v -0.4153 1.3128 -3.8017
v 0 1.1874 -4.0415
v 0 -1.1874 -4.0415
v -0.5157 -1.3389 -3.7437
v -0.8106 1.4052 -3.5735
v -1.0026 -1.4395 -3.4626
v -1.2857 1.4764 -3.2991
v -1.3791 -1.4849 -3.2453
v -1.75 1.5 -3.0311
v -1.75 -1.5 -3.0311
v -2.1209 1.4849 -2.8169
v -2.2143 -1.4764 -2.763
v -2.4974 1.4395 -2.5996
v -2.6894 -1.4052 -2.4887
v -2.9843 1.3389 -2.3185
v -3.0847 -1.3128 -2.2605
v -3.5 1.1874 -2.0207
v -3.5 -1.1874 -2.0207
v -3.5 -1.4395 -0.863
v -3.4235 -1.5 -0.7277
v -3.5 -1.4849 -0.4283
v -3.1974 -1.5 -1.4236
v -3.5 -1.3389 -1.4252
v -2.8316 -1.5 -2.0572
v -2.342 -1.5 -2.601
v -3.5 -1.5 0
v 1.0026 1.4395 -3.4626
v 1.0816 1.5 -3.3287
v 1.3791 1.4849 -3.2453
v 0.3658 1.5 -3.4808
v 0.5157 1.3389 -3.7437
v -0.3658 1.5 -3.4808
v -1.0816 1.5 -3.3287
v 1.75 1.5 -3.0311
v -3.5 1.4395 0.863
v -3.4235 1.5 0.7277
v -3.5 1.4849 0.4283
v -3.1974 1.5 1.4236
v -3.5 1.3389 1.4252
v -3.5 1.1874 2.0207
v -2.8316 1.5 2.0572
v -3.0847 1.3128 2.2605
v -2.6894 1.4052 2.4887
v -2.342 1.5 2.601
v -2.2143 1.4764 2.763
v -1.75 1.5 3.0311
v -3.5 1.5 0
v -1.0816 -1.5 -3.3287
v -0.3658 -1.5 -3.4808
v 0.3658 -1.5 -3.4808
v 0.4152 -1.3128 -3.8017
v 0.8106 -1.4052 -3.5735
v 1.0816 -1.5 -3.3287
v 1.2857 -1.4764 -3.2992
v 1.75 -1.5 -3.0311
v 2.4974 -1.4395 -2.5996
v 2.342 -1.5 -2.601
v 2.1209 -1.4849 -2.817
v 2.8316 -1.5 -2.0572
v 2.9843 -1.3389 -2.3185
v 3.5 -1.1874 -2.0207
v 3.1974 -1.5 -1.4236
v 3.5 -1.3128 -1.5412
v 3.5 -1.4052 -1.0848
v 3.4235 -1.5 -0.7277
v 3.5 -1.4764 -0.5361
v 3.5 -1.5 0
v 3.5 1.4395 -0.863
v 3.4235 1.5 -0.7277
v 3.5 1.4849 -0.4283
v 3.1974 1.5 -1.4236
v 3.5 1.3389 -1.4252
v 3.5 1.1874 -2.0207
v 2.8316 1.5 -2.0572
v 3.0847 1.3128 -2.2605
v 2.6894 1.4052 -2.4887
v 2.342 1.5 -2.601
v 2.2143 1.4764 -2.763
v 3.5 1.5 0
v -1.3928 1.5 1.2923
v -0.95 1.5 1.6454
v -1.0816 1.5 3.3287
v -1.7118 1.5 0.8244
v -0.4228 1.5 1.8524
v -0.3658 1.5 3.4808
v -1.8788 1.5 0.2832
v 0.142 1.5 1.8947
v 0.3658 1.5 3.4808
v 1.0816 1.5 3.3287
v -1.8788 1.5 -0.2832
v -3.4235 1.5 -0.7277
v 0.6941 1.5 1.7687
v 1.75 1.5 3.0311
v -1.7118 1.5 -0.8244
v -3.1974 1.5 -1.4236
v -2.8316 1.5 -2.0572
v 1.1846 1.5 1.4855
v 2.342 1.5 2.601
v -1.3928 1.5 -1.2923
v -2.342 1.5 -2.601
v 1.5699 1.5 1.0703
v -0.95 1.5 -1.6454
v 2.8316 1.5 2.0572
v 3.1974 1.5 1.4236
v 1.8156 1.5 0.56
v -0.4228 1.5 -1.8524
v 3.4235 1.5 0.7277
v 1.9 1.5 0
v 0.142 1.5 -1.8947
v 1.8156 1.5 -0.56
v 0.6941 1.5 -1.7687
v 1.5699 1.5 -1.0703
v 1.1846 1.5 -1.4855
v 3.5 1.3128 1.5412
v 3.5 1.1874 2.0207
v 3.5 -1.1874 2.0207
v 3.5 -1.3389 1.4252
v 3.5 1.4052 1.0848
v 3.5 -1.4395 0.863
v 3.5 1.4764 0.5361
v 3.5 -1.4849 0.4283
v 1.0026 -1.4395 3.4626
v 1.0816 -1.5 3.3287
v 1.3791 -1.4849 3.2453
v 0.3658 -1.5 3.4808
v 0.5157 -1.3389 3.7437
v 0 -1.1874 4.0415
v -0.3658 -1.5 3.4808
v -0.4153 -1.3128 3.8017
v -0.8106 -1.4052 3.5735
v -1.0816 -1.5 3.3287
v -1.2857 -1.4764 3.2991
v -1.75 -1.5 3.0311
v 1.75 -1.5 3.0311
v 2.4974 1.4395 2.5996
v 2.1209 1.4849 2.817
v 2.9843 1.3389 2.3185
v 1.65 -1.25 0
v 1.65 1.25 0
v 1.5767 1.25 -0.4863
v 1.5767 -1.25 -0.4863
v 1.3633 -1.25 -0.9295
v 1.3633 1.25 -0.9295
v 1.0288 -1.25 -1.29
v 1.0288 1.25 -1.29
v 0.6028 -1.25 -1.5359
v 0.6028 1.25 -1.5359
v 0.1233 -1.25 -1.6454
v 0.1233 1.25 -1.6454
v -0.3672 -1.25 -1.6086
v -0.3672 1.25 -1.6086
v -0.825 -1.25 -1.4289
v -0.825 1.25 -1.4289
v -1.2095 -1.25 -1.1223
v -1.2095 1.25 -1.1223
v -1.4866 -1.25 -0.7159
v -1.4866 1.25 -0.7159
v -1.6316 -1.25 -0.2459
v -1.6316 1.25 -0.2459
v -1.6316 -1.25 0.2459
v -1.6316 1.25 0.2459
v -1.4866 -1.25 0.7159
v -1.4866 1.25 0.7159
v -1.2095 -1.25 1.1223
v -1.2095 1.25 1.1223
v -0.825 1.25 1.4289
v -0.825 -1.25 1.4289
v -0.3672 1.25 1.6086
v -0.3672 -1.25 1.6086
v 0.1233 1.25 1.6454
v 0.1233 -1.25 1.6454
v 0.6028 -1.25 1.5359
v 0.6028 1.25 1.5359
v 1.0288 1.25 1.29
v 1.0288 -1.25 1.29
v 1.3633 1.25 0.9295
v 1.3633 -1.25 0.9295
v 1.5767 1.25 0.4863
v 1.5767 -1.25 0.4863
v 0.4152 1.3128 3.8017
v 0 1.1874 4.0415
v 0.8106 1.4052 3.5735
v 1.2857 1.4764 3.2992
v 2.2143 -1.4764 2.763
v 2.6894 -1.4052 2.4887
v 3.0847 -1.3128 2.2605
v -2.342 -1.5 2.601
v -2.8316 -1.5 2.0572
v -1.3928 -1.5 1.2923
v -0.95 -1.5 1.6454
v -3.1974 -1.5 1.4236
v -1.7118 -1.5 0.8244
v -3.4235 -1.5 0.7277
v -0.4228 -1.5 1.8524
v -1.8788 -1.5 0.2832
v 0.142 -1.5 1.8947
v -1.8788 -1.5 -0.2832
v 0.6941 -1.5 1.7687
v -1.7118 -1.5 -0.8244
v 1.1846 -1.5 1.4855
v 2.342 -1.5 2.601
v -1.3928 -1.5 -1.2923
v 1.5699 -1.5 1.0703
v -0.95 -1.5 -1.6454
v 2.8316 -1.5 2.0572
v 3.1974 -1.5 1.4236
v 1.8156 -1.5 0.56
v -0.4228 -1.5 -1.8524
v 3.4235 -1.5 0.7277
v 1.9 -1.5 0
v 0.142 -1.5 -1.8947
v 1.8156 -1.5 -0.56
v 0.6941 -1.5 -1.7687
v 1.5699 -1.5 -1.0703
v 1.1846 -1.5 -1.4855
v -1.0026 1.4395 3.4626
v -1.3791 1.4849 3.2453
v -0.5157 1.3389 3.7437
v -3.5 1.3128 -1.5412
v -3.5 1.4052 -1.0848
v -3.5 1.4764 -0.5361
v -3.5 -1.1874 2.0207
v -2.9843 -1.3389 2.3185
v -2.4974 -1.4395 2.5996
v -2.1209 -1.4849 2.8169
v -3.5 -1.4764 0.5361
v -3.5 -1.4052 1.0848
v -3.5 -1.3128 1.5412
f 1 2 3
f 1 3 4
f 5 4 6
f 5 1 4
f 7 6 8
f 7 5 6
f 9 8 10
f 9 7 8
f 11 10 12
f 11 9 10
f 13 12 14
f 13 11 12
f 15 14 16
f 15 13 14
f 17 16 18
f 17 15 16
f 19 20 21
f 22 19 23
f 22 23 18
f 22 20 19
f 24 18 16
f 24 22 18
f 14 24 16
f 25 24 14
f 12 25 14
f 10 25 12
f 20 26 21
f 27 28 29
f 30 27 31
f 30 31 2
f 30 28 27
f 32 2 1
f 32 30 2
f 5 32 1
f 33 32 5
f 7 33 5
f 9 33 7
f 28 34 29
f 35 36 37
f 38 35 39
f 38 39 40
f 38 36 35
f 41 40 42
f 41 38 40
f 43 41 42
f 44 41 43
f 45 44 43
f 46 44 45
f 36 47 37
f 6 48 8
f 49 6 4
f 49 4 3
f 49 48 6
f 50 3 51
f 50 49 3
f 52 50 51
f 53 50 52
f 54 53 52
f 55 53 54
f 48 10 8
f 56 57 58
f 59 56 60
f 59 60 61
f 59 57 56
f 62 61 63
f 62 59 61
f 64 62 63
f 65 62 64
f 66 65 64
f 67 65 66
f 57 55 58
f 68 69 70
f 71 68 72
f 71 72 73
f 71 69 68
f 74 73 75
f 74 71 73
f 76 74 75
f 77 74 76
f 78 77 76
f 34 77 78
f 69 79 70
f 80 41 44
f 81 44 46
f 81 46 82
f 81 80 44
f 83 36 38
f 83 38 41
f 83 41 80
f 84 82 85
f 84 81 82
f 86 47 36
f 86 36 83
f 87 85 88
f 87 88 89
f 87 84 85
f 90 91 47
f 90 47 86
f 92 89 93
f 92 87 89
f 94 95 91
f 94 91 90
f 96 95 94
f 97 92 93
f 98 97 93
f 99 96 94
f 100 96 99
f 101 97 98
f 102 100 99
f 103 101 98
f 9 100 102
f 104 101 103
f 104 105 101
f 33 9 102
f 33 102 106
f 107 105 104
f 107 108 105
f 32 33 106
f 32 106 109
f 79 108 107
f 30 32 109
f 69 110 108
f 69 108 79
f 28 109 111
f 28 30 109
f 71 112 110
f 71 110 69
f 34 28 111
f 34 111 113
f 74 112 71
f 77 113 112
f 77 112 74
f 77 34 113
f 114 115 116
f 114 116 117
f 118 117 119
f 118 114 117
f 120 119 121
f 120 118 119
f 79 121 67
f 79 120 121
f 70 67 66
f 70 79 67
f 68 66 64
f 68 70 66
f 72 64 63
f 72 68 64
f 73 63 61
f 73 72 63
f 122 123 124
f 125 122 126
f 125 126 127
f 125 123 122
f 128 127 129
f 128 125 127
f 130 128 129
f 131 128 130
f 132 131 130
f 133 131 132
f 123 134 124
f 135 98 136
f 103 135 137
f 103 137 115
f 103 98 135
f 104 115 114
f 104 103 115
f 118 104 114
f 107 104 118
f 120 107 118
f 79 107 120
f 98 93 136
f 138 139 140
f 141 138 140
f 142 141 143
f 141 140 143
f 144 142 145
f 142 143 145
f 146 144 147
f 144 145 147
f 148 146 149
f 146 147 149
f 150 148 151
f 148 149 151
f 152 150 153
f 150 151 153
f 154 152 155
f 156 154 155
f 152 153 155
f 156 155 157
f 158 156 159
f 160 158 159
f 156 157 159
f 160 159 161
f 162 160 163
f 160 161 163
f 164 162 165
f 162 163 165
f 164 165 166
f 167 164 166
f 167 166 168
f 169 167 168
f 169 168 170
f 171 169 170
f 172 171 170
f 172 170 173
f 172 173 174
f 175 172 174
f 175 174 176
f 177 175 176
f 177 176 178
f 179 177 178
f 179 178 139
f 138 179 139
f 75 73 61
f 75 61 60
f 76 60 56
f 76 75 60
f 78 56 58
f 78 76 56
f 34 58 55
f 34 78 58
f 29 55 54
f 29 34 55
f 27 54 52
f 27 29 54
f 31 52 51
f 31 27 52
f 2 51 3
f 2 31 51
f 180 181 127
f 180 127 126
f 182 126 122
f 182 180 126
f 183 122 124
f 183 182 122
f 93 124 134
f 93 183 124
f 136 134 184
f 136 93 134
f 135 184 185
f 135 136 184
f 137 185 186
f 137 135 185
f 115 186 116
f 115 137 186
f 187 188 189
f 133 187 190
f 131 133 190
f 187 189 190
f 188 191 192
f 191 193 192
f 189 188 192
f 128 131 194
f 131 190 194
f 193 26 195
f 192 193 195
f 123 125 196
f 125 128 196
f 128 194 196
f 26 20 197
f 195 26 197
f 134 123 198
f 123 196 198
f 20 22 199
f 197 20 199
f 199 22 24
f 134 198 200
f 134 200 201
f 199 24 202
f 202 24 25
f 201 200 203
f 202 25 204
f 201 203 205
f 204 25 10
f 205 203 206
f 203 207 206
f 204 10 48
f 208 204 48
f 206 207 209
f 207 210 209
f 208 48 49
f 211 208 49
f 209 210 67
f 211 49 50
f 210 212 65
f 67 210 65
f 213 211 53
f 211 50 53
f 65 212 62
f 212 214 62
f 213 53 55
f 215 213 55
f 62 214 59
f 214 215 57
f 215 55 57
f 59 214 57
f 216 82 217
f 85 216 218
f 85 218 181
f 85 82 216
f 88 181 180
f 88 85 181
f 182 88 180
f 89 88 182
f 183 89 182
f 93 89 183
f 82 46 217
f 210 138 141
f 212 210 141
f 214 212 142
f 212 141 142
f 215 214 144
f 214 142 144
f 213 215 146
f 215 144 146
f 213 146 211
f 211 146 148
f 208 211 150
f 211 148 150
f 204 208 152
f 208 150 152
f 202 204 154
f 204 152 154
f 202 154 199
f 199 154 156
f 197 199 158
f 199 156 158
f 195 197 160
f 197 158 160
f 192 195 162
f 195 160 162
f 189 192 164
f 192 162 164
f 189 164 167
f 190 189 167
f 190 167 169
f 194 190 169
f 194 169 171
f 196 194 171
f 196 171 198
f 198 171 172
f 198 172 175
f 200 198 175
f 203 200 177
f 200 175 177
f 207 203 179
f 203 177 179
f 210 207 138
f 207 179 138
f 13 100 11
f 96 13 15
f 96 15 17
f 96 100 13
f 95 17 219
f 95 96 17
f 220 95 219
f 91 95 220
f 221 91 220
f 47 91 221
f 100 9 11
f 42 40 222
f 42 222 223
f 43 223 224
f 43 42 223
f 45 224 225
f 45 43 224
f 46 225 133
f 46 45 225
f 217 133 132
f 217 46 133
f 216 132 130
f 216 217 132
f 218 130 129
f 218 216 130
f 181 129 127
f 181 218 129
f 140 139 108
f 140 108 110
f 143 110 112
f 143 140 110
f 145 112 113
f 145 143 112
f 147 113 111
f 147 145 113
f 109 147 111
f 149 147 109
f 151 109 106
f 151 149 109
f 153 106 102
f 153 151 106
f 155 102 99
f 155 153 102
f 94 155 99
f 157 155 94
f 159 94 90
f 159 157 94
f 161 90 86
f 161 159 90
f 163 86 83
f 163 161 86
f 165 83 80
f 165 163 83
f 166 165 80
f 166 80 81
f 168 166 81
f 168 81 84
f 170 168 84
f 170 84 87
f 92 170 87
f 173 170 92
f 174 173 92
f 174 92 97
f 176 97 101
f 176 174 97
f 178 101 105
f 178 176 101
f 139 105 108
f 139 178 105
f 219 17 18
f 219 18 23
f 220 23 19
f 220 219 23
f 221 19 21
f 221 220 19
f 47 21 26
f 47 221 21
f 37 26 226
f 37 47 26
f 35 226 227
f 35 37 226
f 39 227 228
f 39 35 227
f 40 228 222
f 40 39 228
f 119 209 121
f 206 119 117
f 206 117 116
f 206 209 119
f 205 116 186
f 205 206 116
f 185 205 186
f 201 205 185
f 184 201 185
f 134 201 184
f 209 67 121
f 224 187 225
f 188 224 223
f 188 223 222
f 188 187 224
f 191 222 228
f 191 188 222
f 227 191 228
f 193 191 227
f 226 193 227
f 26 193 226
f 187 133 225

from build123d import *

# Parameters (mm, degrees)
BOSS_EXTRUDE1_DEPTH     = 1.5
SKETCH2_OUTSIDE_W       = 19.534
SKETCH2_OUTSIDE_H       = 20.616
SKETCH2_OUTSIDE_R       = 3.5
CUT_EXTRUDE1_DEPTH      = 2.4
CUT_EXTRUDE1_DRAFT      = -60
MIRROR1_COPY_1_SKETCH_W = 19.534
MIRROR1_COPY_1_SKETCH_H = 20.616
MIRROR1_COPY_1_SKETCH_R = 3.5
MIRROR1_COPY_1_DEPTH    = 2.4
MIRROR1_COPY_1_DRAFT    = -60
TAPPED_HOLE1_D          = 3.3
CHAMFER1_SIZE           = 0.25


with BuildPart() as part:
    # Sketch1 → Boss-Extrude1 (new, symmetric)
    with BuildSketch(Plane(origin=(0, 0, 0), x_dir=(1, 0, 0), z_dir=(0, 1, 0))):
        Polygon((3.5, -2.020725942), (3.5, 2.020725942), (0, 4.041451884), (-3.5, 2.020725942), (-3.5, -2.020725942), (0, -4.041451884), align=None)
    extrude(amount=BOSS_EXTRUDE1_DEPTH, both=True)


with BuildPart() as cut_extrude1_tool:
    # Sketch2 outside → Cut-Extrude1 (with draft: the straight prism first)
    with BuildSketch(Plane(origin=(0, 1.5, 0), x_dir=(1, 0, 0), z_dir=(0, 1, 0))):
        Rectangle(SKETCH2_OUTSIDE_W, SKETCH2_OUTSIDE_H)
        Circle(SKETCH2_OUTSIDE_R, mode=Mode.SUBTRACT)
    extrude(amount=-CUT_EXTRUDE1_DEPTH)
    # Cut-Extrude1: the draft: its side faces are tilted about the plane it starts from
    cut_extrude1_sides = [cut_extrude1_tool.faces().sort_by_distance(p)[0] for p in [
        (0, 0.3, 10.308),
        (9.767, 0.3, 0),
        (0, 0.3, -10.308),
        (-9.767, 0.3, 0),
        (-3.5, 0.3, 0),
    ]]
    draft(cut_extrude1_sides, Plane(origin=(0, 1.5, 0), x_dir=(1, 0, 0), z_dir=(0, 1, 0)), CUT_EXTRUDE1_DRAFT)


with BuildPart() as part_1:
    add(part.part)

    # Cut-Extrude1: cut by cut_extrude1_tool
    add(cut_extrude1_tool.part, mode=Mode.SUBTRACT)


with BuildPart() as mirror1_copy_1_tool:
    # Mirror1 copy 1 sketch → Mirror1 copy 1 (with draft: the straight prism first)
    with BuildSketch(Plane.XZ.offset(1.5)):
        Rectangle(MIRROR1_COPY_1_SKETCH_W, MIRROR1_COPY_1_SKETCH_H)
        Circle(MIRROR1_COPY_1_SKETCH_R, mode=Mode.SUBTRACT)
    extrude(amount=-MIRROR1_COPY_1_DEPTH)
    # Mirror1 copy 1: the draft: its side faces are tilted about the plane it starts from
    mirror1_copy_1_sides = [mirror1_copy_1_tool.faces().sort_by_distance(p)[0] for p in [
        (0, -0.3, 10.308),
        (9.767, -0.3, 0),
        (0, -0.3, -10.308),
        (-9.767, -0.3, 0),
        (-3.5, -0.3, 0),
    ]]
    draft(mirror1_copy_1_sides, Plane.XZ.offset(1.5), MIRROR1_COPY_1_DRAFT)


with BuildPart() as part_2:
    add(part_1.part)

    # Mirror1 copy 1: cut by mirror1_copy_1_tool
    add(mirror1_copy_1_tool.part, mode=Mode.SUBTRACT)

    # Tapped Hole1 (through all)
    with Locations(Plane(origin=(0, -1.5, 0), x_dir=(-1, 0, 0), z_dir=(0, -1, 0))):
        with Locations((0, 0)):
            Hole(TAPPED_HOLE1_D / 2)

    # Chamfer1
    chamfer1_edges = [part_2.edges().sort_by_distance(p)[0] for p in [
        (-1.65, -1.5, 0),
        (-1.65, 1.5, 0),
    ]]
    chamfer(chamfer1_edges, length=CHAMFER1_SIZE)


solid = part_2.part
